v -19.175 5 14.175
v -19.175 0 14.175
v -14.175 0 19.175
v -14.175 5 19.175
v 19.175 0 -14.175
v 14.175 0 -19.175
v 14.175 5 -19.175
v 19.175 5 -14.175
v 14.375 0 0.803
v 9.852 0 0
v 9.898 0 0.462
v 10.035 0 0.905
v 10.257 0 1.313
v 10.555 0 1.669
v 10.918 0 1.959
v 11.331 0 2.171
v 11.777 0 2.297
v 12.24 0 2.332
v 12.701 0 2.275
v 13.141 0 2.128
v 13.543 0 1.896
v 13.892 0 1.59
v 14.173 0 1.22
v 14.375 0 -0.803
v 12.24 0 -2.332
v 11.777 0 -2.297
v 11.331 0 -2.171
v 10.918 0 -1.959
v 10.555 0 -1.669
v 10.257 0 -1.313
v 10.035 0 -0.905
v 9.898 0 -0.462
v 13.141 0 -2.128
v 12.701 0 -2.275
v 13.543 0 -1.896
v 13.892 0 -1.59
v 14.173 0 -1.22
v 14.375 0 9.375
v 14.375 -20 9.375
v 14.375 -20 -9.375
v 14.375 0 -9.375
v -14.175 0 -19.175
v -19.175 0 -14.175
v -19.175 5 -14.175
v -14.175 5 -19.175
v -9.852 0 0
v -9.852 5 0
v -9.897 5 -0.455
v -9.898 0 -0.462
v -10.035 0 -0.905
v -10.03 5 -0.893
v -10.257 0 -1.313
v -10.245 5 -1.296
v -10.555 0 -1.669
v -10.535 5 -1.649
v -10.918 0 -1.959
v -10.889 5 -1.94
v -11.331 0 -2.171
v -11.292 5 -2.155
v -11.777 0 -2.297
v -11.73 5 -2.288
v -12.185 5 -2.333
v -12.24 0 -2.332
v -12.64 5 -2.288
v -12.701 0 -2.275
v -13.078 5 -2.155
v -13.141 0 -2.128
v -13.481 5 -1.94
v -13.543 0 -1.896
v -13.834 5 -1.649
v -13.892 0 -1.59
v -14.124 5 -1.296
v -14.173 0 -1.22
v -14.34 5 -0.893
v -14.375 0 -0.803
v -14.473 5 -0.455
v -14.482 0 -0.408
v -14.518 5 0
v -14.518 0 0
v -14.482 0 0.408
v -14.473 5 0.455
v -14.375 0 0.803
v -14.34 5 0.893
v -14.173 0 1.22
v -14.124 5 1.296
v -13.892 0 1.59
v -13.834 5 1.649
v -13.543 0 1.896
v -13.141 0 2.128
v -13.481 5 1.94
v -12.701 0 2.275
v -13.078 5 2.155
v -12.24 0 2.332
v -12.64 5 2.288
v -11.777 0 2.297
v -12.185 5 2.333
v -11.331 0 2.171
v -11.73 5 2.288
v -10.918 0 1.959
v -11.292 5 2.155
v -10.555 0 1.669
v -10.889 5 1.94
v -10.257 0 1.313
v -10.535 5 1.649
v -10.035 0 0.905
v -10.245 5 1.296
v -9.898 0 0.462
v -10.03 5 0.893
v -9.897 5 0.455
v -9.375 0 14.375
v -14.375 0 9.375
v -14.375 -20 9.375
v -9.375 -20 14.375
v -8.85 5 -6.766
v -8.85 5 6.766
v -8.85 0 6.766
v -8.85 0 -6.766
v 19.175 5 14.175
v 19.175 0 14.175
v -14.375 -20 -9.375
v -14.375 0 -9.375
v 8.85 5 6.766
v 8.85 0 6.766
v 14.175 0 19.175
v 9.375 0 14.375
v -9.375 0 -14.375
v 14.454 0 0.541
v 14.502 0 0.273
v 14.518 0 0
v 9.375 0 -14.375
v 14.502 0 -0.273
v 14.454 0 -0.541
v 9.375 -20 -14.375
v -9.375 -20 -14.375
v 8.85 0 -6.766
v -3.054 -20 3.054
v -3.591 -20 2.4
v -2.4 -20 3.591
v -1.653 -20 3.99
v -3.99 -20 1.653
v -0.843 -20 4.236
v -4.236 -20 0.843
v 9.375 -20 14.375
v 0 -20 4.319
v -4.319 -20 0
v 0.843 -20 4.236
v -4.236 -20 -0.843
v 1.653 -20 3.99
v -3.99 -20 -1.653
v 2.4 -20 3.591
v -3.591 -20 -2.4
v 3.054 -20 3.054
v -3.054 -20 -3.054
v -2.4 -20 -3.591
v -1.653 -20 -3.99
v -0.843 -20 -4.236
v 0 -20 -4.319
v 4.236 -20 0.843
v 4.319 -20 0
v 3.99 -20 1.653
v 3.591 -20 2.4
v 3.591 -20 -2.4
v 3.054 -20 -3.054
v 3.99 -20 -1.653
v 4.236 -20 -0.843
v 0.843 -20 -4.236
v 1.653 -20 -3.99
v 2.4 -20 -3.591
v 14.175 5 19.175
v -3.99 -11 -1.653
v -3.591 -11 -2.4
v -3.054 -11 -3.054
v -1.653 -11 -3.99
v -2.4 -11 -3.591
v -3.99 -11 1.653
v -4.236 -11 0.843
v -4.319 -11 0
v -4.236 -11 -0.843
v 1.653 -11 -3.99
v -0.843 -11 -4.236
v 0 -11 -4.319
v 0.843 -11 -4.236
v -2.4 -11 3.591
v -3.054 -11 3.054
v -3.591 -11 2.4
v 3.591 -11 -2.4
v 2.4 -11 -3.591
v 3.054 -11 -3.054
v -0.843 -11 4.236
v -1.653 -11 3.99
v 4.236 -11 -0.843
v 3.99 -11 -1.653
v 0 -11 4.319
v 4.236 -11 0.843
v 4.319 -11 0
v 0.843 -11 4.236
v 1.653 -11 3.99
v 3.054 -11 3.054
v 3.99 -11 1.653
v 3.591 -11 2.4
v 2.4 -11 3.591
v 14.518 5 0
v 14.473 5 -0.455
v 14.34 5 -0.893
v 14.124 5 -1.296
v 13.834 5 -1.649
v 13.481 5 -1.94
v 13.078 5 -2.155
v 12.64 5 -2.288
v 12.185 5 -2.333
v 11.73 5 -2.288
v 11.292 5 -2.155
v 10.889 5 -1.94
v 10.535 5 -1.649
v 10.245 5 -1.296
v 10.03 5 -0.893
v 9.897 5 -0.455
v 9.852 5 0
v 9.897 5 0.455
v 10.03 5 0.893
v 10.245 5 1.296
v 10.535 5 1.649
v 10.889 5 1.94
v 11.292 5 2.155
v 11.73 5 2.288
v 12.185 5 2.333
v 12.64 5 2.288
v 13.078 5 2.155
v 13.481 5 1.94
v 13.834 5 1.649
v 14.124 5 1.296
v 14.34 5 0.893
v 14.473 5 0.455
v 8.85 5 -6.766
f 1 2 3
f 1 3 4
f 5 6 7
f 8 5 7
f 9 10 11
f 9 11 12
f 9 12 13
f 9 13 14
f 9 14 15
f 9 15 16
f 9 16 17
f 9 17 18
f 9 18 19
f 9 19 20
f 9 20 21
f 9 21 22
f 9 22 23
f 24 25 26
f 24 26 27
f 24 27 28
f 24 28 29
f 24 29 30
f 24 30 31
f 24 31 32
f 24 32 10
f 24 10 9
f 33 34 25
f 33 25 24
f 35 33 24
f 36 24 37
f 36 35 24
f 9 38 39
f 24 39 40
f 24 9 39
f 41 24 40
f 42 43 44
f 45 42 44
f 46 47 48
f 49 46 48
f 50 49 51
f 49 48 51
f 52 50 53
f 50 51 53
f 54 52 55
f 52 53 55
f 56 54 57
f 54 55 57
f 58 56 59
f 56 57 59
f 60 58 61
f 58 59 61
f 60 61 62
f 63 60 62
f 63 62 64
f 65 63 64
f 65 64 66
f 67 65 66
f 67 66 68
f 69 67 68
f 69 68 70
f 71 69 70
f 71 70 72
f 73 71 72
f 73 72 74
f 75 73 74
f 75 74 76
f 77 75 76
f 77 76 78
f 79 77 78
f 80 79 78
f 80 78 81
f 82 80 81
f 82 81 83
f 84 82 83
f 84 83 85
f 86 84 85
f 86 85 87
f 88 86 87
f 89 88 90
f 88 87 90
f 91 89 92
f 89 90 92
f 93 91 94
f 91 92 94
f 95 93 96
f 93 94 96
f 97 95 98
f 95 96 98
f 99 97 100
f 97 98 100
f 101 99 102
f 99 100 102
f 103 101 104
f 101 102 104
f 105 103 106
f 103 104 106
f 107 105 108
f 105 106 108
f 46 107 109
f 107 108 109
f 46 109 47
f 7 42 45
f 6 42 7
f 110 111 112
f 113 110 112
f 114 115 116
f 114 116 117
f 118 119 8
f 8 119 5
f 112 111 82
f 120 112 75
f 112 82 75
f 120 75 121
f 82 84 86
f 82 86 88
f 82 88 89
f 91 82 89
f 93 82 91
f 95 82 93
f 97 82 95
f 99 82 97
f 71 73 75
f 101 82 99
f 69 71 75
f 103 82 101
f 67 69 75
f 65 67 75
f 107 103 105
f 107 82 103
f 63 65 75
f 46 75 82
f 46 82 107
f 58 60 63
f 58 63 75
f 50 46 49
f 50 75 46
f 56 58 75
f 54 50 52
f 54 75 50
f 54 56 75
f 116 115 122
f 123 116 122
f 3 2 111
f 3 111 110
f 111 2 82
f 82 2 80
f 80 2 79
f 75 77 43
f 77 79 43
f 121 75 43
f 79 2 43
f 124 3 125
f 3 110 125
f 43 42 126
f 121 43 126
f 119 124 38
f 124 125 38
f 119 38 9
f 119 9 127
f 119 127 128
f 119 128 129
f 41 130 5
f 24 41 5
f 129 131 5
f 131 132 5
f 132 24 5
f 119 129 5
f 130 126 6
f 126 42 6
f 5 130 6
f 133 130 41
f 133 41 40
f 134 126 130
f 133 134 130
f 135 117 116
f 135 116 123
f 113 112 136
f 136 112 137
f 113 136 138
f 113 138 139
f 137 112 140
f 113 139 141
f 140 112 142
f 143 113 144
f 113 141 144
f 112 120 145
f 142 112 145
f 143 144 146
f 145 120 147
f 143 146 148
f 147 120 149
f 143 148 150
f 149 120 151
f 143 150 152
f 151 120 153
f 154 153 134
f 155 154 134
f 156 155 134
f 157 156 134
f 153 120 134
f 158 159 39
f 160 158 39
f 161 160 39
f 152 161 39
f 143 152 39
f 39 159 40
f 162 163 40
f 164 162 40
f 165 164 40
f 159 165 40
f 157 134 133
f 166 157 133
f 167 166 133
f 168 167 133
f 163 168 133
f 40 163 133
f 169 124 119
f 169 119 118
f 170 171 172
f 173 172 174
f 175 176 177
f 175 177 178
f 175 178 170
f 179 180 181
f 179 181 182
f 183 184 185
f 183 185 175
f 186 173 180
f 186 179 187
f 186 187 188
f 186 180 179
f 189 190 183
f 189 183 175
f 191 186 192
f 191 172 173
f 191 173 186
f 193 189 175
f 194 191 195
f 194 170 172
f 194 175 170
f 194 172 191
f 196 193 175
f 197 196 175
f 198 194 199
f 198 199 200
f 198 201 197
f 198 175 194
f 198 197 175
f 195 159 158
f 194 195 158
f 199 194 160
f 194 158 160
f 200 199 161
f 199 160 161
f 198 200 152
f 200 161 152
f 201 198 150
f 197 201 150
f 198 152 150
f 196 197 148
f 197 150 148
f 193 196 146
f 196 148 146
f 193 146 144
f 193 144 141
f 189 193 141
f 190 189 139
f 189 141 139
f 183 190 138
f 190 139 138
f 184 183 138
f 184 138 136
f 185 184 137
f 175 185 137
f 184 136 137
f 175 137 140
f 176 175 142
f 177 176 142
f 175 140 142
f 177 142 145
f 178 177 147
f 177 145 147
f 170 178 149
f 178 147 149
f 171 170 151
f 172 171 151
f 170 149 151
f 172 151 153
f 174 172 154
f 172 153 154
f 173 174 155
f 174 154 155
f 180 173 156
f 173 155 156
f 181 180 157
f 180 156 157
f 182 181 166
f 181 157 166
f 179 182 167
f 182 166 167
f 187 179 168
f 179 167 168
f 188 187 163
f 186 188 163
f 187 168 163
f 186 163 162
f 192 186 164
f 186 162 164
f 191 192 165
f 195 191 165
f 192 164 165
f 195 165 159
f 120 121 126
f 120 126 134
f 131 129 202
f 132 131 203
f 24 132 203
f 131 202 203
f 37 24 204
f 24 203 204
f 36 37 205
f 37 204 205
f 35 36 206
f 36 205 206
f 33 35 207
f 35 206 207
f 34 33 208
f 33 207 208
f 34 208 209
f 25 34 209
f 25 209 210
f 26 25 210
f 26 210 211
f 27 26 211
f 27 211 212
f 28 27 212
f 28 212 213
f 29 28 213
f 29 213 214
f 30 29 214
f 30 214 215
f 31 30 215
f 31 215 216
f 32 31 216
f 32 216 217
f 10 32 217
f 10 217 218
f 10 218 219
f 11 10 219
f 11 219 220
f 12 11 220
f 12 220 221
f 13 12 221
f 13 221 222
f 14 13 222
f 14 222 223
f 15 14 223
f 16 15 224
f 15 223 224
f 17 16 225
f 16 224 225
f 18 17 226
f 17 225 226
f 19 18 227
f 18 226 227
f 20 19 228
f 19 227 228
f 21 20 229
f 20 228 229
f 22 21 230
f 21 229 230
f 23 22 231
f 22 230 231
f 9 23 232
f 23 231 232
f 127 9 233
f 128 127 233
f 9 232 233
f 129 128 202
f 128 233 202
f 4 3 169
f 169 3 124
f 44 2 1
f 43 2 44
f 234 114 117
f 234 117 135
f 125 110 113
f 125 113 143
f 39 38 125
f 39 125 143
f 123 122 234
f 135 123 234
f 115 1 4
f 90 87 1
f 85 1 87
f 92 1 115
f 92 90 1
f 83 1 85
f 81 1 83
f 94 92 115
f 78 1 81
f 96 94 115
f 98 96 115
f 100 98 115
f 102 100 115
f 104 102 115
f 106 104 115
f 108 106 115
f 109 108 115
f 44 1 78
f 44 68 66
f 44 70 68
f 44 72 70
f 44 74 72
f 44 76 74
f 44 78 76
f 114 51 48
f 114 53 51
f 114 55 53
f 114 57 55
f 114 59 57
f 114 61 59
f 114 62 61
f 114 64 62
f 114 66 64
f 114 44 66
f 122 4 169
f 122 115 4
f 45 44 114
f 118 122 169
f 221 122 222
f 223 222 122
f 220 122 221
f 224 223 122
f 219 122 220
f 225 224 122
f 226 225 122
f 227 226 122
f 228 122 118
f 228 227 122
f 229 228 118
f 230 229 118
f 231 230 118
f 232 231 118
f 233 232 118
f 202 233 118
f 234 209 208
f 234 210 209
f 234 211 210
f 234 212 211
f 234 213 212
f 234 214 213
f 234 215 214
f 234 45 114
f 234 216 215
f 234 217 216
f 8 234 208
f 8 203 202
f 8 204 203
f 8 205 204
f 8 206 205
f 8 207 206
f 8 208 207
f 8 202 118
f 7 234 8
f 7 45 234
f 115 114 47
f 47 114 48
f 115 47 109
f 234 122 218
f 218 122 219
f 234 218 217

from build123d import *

# Parameters (mm, degrees)
SKETCH1_W           = 38.350231224
SKETCH1_H           = 38.350231224
BOSS_EXTRUDE1_DEPTH = 5
SKETCH2_W           = 28.750231224
SKETCH2_H           = 28.750231224
BOSS_EXTRUDE2_DEPTH = 20
CHAMFER1_SIZE       = 5
SKETCH3_R           = 2.332714882
SKETCH3_W           = 17.69914949
SKETCH3_H           = 13.531318076
CUT_EXTRUDE1_DEPTH  = 5
SKETCH4_R           = 4.319213653
CUT_EXTRUDE2_DEPTH  = 9


with BuildPart() as part:
    # Sketch1 → Boss-Extrude1 (new body)
    with BuildSketch(Plane(origin=(0, 0, 0), x_dir=(1, 0, 0), z_dir=(0, 1, 0))):
        Rectangle(SKETCH1_W, SKETCH1_H)
    extrude(amount=BOSS_EXTRUDE1_DEPTH)

    # Sketch2 → Boss-Extrude2 (add)
    with BuildSketch(Plane(origin=(0, 0, 0), x_dir=(1, 0, 0), z_dir=(0, 1, 0))):
        Rectangle(SKETCH2_W, SKETCH2_H)
    extrude(amount=-BOSS_EXTRUDE2_DEPTH)

    # Chamfer1
    chamfer1_edges = [part.edges().sort_by_distance(p)[0] for p in [
        (14.375115612, -10, -14.375115612),
        (14.375115612, -10, 14.375115612),
        (-14.375115612, -10, 14.375115612),
        (-14.375115612, -10, -14.375115612),
        (19.175115612, 2.5, 19.175115612),
        (-19.175115612, 2.5, 19.175115612),
        (-19.175115612, 2.5, -19.175115612),
        (19.175115612, 2.5, -19.175115612),
    ]]
    chamfer(chamfer1_edges, length=CHAMFER1_SIZE)

    # Sketch3 → Cut-Extrude1 (cut)
    with BuildSketch(Plane(origin=(0, 5, 0), x_dir=(1, 0, 0), z_dir=(0, 1, 0))):
        with Locations((-12.184831311, 0)):
            Circle(SKETCH3_R)
        with Locations((12.184831311, 0)):
            Circle(SKETCH3_R)
        Rectangle(SKETCH3_W, SKETCH3_H)
    extrude(amount=-CUT_EXTRUDE1_DEPTH, mode=Mode.SUBTRACT)

    # Sketch4 → Cut-Extrude2 (cut)
    with BuildSketch(Plane.XZ.offset(20)):
        Circle(SKETCH4_R)
    extrude(amount=-CUT_EXTRUDE2_DEPTH, mode=Mode.SUBTRACT)


solid = part.part
